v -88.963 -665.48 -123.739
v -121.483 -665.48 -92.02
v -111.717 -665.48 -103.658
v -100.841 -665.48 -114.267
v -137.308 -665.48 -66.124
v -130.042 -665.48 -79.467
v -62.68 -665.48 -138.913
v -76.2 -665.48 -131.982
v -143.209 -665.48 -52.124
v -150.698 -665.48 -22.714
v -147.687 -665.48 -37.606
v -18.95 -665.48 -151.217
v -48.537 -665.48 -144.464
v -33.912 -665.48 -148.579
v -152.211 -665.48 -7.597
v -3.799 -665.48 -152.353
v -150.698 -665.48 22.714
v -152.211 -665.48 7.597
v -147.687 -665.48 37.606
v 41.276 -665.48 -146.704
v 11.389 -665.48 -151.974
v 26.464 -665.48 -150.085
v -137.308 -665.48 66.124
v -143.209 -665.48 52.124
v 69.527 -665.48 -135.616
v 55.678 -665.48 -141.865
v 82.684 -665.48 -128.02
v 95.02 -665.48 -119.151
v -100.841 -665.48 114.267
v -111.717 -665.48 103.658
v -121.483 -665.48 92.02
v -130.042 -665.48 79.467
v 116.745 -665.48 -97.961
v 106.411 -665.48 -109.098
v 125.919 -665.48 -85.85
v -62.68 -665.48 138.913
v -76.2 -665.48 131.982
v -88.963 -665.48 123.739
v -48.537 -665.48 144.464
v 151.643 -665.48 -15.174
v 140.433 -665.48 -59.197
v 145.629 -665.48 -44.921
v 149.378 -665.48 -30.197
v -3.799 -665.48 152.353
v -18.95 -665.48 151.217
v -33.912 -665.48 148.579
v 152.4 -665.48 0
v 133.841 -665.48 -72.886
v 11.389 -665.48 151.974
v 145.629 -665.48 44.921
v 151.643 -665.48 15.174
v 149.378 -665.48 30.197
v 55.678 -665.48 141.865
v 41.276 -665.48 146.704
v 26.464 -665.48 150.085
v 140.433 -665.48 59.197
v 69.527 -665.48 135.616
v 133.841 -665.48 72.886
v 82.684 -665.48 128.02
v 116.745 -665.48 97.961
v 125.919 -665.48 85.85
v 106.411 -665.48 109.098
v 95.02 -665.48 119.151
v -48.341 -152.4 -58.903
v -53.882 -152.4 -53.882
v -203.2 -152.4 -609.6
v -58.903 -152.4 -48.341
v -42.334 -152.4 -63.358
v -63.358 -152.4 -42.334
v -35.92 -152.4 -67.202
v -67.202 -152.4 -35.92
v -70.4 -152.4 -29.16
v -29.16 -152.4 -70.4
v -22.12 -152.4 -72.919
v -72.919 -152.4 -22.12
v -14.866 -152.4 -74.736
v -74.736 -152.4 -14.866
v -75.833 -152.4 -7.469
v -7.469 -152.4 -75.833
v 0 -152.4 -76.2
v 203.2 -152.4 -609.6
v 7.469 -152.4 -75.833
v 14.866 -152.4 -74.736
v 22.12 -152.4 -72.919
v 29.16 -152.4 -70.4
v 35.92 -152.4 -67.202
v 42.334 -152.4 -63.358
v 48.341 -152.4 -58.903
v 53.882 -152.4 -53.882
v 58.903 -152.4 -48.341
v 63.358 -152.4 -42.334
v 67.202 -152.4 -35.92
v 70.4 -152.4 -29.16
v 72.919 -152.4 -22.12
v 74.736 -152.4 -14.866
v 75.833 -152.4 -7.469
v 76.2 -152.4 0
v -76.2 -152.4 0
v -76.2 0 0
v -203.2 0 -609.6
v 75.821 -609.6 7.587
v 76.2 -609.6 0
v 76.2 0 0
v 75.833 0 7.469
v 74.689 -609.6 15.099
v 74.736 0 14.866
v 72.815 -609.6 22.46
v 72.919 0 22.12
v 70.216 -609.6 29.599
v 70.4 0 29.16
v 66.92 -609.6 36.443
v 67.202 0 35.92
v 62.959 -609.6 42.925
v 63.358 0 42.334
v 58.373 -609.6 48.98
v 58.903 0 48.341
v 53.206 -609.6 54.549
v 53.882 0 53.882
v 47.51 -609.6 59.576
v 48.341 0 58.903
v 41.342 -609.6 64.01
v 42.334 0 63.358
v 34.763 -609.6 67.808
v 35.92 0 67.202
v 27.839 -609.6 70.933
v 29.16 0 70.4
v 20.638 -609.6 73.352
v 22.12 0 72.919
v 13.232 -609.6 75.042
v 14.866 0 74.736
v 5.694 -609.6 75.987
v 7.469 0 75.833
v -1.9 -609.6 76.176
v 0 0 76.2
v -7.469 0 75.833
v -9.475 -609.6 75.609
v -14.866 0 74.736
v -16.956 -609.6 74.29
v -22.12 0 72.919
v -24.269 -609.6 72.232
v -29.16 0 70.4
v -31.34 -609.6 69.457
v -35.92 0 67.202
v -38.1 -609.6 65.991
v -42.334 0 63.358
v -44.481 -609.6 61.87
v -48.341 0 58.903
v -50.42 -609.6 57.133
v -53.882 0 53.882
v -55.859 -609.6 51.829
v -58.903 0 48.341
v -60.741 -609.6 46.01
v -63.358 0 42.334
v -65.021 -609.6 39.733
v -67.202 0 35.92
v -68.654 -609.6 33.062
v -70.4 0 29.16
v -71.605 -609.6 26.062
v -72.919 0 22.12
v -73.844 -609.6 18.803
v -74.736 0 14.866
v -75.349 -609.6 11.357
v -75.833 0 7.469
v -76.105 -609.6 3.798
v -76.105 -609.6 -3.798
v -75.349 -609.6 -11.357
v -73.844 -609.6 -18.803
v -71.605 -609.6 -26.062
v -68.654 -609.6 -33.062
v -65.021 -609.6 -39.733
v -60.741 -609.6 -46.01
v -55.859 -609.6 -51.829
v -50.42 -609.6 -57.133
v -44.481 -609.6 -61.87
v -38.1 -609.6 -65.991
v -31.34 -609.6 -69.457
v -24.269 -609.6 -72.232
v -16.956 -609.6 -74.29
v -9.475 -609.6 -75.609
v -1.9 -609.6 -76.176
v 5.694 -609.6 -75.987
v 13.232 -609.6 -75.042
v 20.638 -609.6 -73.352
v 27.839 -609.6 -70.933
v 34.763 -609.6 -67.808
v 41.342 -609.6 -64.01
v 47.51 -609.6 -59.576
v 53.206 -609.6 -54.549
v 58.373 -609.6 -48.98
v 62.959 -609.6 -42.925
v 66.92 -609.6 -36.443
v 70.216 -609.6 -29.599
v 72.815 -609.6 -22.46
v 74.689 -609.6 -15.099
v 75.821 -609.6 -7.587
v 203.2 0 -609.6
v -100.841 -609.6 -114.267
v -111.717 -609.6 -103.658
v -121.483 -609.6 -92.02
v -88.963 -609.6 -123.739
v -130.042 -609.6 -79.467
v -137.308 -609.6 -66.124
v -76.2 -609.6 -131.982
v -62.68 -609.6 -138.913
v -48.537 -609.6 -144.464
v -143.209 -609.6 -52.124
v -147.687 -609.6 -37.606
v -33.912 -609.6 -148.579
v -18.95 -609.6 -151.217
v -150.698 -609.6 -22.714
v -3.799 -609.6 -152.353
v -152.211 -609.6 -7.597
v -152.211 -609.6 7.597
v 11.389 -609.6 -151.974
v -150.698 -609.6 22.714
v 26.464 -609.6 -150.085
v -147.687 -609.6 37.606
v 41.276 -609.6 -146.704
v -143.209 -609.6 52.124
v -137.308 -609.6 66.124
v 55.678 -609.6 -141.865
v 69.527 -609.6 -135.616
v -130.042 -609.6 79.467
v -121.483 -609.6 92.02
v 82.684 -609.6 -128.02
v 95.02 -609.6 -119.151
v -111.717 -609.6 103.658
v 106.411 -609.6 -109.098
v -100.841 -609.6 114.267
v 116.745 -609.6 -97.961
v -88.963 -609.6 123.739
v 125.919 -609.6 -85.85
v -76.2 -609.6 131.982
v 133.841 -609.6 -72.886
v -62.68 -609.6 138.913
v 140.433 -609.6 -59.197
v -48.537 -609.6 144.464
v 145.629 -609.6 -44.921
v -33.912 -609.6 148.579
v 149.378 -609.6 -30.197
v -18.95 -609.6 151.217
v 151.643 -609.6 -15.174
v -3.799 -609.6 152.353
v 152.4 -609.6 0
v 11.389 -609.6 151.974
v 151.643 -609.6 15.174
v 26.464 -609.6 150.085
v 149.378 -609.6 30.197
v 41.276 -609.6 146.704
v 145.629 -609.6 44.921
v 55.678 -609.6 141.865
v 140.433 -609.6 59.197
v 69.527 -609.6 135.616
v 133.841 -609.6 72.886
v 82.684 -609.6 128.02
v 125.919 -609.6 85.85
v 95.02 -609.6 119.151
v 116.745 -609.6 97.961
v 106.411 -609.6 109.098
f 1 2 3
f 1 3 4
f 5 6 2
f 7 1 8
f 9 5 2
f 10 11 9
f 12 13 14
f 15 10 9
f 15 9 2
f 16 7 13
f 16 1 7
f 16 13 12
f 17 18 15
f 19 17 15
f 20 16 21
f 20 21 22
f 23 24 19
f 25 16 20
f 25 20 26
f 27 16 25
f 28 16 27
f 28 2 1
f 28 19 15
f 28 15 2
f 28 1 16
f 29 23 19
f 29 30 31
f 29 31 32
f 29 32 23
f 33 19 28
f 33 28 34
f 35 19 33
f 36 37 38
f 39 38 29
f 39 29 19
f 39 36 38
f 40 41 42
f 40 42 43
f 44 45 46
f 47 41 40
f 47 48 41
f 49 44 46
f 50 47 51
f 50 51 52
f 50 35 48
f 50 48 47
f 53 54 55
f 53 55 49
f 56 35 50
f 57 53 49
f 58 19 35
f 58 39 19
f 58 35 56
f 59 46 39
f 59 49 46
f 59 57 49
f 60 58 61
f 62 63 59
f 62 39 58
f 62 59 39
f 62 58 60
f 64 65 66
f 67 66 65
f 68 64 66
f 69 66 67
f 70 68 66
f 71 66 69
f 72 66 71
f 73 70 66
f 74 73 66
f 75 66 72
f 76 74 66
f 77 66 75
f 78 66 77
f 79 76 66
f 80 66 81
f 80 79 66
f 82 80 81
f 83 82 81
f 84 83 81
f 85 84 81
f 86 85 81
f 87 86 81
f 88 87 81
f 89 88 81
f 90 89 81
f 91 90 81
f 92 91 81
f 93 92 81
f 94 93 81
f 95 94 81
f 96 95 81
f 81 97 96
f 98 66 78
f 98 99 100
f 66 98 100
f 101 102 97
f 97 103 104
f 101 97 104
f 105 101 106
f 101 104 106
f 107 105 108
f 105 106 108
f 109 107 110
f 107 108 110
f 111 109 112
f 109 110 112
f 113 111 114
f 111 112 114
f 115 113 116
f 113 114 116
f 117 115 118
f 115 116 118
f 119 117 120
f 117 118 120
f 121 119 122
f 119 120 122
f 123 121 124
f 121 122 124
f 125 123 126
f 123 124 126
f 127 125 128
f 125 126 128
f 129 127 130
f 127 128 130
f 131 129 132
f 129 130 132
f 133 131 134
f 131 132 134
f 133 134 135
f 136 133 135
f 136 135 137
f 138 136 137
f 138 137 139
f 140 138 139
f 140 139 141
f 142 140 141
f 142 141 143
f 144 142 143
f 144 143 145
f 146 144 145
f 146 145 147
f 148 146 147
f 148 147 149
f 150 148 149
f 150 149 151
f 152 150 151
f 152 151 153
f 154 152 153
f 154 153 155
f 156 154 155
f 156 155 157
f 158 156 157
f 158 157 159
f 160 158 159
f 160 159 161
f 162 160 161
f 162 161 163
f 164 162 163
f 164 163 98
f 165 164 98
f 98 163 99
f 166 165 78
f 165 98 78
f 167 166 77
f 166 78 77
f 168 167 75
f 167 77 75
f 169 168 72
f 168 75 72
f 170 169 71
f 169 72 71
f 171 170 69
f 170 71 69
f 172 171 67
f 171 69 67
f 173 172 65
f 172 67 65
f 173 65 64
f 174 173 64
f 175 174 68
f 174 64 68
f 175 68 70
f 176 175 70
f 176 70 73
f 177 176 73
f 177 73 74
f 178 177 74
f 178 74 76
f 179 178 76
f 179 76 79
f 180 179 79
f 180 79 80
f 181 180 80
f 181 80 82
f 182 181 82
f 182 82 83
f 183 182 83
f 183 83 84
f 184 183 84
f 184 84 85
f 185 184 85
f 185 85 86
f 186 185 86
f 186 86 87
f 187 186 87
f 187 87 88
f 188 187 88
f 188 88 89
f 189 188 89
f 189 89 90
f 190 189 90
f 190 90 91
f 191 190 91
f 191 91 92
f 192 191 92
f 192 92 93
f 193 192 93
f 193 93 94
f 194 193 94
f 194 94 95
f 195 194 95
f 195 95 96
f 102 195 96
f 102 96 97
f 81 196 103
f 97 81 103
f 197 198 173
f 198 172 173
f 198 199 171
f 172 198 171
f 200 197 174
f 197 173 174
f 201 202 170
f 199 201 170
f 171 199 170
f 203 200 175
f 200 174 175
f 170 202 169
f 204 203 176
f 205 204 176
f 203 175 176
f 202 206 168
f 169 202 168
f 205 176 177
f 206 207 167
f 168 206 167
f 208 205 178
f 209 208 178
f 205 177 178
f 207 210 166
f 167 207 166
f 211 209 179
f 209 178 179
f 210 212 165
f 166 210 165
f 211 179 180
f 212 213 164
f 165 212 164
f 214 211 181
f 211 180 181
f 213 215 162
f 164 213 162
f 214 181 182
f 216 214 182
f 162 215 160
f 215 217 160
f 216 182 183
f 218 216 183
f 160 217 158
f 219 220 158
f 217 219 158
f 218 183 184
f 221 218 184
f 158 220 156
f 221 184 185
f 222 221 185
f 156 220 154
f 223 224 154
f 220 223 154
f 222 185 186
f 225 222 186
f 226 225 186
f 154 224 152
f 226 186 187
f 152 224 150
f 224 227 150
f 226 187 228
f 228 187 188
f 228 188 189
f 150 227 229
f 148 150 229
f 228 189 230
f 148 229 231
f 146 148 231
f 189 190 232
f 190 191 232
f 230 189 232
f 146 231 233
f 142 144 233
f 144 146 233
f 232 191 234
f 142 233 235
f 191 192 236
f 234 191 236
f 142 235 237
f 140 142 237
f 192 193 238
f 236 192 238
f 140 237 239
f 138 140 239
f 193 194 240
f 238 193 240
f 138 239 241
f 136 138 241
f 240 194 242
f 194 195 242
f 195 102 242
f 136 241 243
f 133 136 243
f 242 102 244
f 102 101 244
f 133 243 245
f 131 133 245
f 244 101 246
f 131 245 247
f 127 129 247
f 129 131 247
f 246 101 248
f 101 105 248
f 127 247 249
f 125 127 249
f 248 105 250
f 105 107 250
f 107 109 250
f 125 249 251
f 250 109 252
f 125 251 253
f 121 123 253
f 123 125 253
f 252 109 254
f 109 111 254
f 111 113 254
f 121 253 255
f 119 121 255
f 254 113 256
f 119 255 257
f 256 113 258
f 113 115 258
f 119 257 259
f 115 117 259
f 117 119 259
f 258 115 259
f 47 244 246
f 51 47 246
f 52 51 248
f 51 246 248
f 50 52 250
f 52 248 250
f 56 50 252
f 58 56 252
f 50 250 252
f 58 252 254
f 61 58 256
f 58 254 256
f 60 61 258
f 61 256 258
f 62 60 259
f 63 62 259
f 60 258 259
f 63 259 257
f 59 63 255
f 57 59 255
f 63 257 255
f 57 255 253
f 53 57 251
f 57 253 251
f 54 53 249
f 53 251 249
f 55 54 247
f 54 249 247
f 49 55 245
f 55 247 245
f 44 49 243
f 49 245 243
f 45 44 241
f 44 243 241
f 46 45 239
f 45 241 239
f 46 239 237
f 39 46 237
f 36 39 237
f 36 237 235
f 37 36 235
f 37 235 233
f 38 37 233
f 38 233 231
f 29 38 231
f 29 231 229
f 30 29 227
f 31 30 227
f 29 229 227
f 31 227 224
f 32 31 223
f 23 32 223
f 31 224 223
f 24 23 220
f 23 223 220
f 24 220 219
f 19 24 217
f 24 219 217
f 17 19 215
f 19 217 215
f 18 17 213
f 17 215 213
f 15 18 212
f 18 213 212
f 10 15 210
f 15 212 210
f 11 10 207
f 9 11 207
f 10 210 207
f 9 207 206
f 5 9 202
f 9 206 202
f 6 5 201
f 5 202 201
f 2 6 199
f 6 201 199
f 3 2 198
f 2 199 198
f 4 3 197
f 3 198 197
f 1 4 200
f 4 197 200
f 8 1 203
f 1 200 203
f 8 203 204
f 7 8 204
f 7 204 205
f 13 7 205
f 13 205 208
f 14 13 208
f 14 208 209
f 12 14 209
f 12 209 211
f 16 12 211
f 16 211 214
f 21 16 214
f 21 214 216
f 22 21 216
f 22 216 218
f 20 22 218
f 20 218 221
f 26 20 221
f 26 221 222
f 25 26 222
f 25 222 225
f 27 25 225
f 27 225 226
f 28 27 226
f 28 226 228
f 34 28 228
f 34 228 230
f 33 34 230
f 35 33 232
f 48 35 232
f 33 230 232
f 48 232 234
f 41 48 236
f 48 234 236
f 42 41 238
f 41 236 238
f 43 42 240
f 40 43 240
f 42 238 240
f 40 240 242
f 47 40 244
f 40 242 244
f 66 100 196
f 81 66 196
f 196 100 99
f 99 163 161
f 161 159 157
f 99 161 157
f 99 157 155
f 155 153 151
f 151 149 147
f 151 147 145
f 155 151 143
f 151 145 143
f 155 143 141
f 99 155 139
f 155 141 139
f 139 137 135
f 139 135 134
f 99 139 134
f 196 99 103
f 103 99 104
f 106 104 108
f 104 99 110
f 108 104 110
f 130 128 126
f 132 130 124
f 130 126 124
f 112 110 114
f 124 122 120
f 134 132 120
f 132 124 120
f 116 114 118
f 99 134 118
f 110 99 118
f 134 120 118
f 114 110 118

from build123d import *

# Parameters (mm, degrees)
F1_DEPTH = 609.6
F2_DEPTH = 152.4
F3_R     = 152.4
F4_DEPTH = 55.88


with BuildPart() as f1:
    # F0 (on Front) → F1 (new body)
    with BuildSketch(Plane.XZ):
        with BuildLine():
            ThreePointArc((-76.2, 0), (0, -76.2), (76.2, 0))
            ThreePointArc((76.2, 0), (0, 76.2), (-76.2, 0))
        make_face()
    extrude(amount=F1_DEPTH)

    # F0 (on Front) → F2 (join)
    with BuildSketch(Plane.XZ):
        with BuildLine():
            Line((203.2, -609.6), (76.2, 0))
            ThreePointArc((76.2, 0), (0, -76.2), (-76.2, 0))
            Line((-76.2, 0), (-203.2, -609.6))
            Line((-203.2, -609.6), (203.2, -609.6))
        make_face()
    extrude(amount=F2_DEPTH)

    # F3 (on face) → F4 (join)
    with BuildSketch(Plane.XZ.offset(609.6)):
        Circle(F3_R)
    extrude(amount=F4_DEPTH)


solid = f1.part
